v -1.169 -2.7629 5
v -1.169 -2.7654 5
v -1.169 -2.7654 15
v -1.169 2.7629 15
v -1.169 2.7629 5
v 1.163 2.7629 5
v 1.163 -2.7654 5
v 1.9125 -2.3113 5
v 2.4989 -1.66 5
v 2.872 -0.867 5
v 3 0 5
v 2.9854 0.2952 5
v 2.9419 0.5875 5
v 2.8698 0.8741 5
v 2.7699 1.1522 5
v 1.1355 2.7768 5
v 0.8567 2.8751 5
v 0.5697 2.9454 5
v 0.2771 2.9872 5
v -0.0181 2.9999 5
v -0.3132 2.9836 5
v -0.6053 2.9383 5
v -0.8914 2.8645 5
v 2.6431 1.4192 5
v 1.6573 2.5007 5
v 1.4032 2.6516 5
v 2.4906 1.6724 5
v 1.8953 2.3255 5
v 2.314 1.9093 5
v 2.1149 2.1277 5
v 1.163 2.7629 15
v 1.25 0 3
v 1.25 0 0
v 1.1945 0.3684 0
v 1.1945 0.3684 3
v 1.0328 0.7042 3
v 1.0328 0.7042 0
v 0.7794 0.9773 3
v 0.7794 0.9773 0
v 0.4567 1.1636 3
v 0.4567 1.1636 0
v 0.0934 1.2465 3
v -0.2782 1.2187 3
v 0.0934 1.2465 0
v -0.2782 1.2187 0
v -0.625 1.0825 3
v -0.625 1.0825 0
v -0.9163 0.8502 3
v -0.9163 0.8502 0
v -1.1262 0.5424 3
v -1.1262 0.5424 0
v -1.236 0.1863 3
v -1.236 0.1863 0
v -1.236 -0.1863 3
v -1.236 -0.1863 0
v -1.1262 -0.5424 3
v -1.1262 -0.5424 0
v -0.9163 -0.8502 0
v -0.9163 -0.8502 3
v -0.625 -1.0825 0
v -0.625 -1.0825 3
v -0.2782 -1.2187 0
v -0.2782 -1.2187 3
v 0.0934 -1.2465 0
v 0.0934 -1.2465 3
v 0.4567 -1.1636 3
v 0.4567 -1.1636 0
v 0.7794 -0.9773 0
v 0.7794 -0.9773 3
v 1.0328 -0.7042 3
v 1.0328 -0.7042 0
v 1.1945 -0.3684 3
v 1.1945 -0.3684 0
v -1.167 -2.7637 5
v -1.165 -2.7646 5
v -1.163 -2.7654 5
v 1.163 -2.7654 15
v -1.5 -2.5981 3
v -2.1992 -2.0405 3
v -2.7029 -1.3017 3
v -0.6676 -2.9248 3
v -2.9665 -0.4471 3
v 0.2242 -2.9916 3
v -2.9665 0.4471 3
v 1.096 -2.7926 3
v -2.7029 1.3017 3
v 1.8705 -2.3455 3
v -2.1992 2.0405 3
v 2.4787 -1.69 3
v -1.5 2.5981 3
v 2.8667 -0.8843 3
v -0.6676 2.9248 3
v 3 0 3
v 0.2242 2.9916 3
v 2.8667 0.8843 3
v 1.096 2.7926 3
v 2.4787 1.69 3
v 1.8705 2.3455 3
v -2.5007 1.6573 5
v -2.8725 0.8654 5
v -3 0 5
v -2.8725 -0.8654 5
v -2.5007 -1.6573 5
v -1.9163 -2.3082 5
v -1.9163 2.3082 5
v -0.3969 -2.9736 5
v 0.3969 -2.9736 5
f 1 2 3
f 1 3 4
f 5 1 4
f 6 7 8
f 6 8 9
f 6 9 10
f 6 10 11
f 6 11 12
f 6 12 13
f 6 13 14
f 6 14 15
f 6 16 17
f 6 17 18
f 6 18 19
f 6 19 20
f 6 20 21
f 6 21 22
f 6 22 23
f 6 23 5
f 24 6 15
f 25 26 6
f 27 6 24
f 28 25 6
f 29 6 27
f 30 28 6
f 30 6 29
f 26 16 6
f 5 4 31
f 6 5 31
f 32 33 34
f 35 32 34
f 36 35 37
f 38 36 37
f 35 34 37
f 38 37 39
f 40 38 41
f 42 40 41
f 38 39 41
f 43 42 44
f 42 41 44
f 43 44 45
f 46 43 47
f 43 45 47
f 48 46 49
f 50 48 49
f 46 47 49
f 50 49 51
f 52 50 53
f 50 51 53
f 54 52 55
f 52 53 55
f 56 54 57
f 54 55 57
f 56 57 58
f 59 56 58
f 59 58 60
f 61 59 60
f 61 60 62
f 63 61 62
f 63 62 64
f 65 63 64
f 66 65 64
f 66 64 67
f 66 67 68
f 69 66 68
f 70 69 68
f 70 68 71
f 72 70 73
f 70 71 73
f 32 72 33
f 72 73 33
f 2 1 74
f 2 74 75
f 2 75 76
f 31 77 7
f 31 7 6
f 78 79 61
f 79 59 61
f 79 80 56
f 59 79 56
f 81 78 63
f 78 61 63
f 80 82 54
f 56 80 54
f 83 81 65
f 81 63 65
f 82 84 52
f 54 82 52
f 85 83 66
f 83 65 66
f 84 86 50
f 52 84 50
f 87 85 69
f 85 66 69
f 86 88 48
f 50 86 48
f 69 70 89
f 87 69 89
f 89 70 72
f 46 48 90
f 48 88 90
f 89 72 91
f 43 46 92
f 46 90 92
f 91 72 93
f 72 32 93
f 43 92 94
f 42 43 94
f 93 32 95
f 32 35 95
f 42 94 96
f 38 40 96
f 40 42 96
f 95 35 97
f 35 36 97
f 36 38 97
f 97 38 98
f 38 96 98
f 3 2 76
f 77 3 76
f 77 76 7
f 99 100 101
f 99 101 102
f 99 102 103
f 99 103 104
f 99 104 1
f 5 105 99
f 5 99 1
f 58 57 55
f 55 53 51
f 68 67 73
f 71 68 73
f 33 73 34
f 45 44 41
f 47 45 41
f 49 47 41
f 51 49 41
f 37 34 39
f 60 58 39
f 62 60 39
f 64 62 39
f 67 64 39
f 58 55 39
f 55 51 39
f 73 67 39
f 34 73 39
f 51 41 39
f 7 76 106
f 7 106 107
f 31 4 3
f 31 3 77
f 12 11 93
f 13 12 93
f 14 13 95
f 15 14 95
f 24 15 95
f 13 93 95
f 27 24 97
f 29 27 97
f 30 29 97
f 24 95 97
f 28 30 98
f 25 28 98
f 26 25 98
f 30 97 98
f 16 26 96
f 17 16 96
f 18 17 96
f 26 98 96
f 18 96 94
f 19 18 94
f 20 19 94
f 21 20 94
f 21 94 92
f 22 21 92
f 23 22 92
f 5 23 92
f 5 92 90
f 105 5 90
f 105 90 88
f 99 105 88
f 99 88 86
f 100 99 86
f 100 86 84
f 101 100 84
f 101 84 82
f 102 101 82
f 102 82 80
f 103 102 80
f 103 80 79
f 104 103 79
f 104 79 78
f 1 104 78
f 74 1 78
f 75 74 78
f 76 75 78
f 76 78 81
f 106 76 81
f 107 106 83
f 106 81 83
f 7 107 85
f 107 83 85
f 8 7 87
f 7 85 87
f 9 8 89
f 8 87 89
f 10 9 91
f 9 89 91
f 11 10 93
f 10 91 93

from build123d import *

# Parameters (mm, degrees)
F0_R     = 1.25
F1_DEPTH = 3
F2_R     = 3
F3_DEPTH = 2
F4_W     = 2.331915
F4_H     = 5.528303
F5_DEPTH = 10


with BuildPart() as f1:
    # F0 (on Top) → F1 (new body)
    with BuildSketch(Plane.XY):
        Circle(F0_R)
    extrude(amount=F1_DEPTH)

    # F2 (on face) → F3 (join)
    with BuildSketch(Plane.XY.offset(3)):
        Circle(F2_R)
    extrude(amount=F3_DEPTH)

    # F4 (on face) → F5 (join)
    with BuildSketch(Plane.XY.offset(5)):
        with Locations((-0.003007, -0.001268)):
            Rectangle(F4_W, F4_H)
    extrude(amount=F5_DEPTH)


solid = f1.part
